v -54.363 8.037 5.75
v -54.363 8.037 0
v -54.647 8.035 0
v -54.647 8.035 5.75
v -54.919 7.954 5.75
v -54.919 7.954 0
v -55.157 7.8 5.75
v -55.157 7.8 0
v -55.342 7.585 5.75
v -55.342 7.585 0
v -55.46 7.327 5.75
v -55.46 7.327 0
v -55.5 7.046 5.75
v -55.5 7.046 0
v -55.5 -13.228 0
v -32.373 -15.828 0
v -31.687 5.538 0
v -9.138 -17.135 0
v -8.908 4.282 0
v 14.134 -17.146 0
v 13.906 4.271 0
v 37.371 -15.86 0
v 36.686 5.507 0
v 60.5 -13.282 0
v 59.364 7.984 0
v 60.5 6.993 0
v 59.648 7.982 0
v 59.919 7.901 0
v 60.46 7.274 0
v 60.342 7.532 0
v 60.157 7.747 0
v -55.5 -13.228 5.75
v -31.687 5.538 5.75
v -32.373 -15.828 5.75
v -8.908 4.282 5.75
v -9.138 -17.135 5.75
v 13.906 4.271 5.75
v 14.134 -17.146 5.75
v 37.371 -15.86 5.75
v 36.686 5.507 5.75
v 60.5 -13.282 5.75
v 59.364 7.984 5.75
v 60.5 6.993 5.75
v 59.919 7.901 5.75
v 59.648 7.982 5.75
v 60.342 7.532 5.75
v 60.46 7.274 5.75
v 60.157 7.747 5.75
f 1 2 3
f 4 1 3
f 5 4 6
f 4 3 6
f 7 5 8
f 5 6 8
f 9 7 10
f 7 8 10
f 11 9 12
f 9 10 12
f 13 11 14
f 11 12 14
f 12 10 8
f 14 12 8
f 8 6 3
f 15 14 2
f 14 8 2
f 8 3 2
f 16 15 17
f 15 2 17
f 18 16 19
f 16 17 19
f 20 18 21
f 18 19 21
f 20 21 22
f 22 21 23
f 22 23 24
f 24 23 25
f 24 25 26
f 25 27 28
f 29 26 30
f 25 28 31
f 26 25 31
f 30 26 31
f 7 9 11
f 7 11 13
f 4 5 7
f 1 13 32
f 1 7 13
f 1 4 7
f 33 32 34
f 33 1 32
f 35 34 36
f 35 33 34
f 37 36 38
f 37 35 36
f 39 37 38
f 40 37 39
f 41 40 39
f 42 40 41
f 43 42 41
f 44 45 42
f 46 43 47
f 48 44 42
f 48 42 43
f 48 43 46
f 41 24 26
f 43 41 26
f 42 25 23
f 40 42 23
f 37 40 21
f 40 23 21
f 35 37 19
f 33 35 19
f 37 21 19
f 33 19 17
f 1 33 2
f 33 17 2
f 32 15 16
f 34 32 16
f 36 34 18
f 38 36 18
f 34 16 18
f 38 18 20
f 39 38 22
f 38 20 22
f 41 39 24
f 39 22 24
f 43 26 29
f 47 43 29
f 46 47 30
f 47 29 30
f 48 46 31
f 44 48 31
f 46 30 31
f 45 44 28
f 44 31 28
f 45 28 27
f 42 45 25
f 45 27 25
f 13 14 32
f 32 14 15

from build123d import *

# Parameters (mm, degrees)
F1_DEPTH = 5.75


# Not quite as in the source:
# - ends of sketch curves that miss each other by under 0.0002 mm in the source are joined


with BuildPart() as f1:
    # F0 (on Top) → F1 (new body)
    with BuildSketch(Plane.XY):
        with BuildLine():
            ThreePointArc((-54.3633709611, 8.0368382821), (-55.1570277624, 7.8000823804), (-55.5, 7.046216))
            Line((-55.5, 7.046216), (-55.5, -13.228097))
            ThreePointArc((-55.5, -13.228097), (2.4981253193, -17.3024292075), (60.5000000667, -13.2818254774))
            Line((60.5000000667, -13.2818254774), (60.5, 6.993434))
            ThreePointArc((60.5, 6.993434), (60.1573766387, 7.7469961772), (59.3642880901, 7.9841823422))
            ThreePointArc((59.3642880901, 7.9841823422), (2.4986576004, 4.1208007581), (-54.3633709611, 8.0368382821))
        make_face()
    extrude(amount=F1_DEPTH)


solid = f1.part
